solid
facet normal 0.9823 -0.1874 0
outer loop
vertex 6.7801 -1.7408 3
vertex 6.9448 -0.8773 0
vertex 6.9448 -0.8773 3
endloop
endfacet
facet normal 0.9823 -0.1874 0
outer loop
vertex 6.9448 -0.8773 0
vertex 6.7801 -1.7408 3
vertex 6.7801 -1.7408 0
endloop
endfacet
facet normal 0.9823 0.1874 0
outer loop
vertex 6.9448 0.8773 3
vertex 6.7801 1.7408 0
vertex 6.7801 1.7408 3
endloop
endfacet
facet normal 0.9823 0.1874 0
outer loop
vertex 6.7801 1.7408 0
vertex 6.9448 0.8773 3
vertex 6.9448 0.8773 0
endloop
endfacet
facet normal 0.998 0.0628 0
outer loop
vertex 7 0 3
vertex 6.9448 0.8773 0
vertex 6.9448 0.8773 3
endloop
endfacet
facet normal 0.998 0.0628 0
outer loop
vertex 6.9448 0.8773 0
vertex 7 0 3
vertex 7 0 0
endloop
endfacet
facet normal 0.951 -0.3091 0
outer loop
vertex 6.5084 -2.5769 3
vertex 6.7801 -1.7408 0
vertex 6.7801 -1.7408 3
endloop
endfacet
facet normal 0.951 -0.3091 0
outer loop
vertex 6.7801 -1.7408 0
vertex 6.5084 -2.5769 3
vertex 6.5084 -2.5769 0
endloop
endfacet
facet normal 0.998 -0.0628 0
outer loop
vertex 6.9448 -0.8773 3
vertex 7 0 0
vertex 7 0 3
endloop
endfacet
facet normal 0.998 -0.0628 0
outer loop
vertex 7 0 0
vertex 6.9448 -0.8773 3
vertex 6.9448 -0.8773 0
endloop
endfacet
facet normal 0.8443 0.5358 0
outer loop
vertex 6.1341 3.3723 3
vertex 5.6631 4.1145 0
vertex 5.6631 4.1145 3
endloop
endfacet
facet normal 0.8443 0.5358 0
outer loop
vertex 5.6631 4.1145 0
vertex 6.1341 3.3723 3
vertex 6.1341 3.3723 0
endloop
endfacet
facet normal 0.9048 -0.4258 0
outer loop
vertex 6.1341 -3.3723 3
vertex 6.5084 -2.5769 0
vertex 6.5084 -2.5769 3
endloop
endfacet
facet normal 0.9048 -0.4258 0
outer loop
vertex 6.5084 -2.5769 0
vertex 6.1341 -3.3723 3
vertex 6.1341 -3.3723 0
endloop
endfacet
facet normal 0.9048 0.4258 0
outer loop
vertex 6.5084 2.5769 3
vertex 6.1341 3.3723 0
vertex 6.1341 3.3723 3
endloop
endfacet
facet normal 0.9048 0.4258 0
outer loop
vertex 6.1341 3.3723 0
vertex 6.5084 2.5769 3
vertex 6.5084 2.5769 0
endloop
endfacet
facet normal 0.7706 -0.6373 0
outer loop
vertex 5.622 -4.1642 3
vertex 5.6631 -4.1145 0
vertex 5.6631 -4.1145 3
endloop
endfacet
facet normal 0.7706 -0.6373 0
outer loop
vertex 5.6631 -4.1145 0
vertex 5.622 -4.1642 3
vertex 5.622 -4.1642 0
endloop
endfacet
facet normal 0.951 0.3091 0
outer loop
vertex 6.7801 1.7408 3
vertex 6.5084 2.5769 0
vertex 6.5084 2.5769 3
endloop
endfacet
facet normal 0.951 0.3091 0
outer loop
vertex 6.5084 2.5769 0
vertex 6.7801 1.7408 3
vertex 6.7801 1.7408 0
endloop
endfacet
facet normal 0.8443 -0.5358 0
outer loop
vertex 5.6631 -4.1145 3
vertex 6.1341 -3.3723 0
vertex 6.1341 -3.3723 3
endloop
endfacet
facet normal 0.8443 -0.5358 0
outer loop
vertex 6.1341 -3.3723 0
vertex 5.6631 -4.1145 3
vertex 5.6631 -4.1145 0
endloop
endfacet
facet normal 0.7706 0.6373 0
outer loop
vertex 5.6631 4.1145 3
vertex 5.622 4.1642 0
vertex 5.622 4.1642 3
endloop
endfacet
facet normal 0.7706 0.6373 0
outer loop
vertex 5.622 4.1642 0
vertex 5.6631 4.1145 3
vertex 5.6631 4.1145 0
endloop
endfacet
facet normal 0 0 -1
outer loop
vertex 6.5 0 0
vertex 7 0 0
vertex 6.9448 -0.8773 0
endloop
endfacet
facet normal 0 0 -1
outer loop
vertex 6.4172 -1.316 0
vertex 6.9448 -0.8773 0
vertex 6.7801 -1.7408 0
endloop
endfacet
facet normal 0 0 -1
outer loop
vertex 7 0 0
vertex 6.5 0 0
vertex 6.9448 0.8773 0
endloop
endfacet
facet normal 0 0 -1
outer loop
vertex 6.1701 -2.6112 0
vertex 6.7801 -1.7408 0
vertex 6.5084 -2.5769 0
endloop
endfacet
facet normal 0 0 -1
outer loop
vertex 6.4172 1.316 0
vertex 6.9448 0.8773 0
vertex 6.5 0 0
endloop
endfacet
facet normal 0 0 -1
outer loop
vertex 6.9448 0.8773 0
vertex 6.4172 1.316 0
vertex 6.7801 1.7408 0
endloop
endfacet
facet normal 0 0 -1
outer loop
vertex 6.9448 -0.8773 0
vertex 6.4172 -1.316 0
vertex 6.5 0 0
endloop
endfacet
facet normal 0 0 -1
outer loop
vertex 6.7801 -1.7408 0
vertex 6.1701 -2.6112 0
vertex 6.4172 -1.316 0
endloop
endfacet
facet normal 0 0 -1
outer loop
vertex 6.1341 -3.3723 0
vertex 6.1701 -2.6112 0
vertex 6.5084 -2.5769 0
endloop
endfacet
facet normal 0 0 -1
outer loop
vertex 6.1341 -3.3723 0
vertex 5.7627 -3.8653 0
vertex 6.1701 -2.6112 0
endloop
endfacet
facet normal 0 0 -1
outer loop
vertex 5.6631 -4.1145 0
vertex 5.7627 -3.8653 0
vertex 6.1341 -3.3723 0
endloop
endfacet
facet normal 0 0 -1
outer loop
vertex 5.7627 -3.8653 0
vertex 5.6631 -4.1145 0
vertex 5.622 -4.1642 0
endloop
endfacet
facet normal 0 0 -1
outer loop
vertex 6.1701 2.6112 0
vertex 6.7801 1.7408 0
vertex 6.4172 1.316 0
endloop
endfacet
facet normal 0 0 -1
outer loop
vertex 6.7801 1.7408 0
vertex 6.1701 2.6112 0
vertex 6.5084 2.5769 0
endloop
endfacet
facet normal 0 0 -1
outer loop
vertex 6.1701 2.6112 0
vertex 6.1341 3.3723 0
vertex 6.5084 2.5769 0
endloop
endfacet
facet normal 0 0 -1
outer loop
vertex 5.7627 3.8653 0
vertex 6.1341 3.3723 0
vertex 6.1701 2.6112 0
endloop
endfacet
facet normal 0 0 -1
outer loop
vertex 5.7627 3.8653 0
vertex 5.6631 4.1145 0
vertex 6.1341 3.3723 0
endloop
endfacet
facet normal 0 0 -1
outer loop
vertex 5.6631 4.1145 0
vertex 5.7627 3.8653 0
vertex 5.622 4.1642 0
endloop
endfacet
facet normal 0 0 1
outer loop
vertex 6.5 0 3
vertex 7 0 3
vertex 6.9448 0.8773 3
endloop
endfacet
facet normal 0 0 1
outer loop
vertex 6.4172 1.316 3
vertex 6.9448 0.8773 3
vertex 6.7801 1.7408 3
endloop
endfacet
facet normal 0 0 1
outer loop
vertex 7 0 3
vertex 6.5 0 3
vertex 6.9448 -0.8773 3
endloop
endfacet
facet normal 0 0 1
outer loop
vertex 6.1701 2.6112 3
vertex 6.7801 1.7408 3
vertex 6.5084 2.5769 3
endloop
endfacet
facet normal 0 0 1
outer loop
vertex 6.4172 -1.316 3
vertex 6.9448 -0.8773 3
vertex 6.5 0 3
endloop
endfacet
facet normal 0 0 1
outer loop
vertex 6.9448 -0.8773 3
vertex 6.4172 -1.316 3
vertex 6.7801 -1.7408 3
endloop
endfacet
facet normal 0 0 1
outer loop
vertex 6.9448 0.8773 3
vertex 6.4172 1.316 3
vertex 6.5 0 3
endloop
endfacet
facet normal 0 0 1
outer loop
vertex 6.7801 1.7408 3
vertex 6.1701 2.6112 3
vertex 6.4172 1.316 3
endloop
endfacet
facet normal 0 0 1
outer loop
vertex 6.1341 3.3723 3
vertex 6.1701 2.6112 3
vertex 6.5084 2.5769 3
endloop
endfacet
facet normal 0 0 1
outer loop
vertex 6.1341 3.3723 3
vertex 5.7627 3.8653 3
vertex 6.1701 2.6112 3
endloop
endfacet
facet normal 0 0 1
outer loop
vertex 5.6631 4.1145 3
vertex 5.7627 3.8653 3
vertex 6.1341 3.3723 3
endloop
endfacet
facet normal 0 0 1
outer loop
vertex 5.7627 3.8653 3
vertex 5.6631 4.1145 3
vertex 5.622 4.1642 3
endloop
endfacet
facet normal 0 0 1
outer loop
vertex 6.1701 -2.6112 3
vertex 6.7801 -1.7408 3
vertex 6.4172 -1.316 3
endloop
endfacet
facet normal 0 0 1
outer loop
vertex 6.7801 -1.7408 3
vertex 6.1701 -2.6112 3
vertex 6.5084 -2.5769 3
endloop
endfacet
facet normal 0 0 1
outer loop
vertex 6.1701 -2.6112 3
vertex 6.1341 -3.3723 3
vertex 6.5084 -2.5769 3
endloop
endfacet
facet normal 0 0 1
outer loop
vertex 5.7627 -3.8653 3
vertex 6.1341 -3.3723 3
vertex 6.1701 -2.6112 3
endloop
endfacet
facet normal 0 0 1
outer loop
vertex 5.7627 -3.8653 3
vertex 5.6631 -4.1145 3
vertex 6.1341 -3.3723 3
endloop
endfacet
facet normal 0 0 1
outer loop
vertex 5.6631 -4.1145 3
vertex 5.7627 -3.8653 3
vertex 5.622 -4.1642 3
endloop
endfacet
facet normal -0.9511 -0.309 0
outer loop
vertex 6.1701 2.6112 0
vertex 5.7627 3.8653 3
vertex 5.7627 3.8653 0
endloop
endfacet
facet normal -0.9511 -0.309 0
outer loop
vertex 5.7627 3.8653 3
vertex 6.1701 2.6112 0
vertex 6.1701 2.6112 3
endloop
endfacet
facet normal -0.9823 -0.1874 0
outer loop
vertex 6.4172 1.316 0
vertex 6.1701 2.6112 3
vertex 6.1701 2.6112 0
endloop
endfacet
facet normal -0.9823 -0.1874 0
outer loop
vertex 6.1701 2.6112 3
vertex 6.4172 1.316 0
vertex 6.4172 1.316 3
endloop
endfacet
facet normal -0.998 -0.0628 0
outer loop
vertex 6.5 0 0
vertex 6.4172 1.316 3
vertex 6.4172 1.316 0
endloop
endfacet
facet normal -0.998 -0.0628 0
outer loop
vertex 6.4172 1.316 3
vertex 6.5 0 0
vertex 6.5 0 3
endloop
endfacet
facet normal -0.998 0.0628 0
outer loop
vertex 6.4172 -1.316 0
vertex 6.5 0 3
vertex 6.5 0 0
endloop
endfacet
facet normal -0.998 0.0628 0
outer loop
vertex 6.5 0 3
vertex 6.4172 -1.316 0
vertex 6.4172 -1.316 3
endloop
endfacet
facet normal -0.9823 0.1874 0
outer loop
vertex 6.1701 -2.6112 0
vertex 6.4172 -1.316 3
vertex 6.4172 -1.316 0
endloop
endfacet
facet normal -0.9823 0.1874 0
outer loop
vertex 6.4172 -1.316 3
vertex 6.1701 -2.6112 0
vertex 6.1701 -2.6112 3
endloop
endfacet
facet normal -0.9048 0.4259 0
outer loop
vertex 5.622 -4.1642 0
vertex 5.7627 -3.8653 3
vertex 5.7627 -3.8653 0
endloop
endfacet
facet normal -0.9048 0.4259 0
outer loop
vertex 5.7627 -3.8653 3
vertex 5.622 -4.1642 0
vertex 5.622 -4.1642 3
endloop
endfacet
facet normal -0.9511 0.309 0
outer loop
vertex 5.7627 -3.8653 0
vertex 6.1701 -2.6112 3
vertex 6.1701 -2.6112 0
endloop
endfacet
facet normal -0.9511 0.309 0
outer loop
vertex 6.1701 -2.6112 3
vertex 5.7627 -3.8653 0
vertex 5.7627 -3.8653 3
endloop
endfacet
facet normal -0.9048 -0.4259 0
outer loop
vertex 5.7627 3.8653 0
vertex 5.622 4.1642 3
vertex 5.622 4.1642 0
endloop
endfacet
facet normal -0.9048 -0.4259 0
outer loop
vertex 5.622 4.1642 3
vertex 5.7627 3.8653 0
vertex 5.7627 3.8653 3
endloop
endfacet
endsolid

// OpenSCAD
$fn = 50;


difference() {
	union() {
		cylinder(h = 3, r = 7.0000000000);
		translate(v = [-7.0000000000, 0, 0]) {
			cylinder(h = 3, r = 7.0000000000);
		}
	}
	union() {
		cylinder(h = 3, r = 3.2500000000);
		cylinder(h = 3, r = 1.8000000000);
		cylinder(h = 3, r = 1.8000000000);
		cylinder(h = 3, r = 1.8000000000);
		translate(v = [-11.5000000000, 0, 0]) {
			hull() {
				translate(v = [-3.7500000000, 0.0000000000, 0]) {
					cylinder(h = 3, r = 7.5000000000);
				}
				translate(v = [3.7500000000, 0.0000000000, 0]) {
					cylinder(h = 3, r = 7.5000000000);
				}
				translate(v = [-3.7500000000, -0.0000000000, 0]) {
					cylinder(h = 3, r = 7.5000000000);
				}
				translate(v = [3.7500000000, -0.0000000000, 0]) {
					cylinder(h = 3, r = 7.5000000000);
				}
			}
		}
		translate(v = [-4.0000000000, 0, 0.0000000000]) {
			cylinder(h = 3, r = 10.5000000000);
		}
	}
}
